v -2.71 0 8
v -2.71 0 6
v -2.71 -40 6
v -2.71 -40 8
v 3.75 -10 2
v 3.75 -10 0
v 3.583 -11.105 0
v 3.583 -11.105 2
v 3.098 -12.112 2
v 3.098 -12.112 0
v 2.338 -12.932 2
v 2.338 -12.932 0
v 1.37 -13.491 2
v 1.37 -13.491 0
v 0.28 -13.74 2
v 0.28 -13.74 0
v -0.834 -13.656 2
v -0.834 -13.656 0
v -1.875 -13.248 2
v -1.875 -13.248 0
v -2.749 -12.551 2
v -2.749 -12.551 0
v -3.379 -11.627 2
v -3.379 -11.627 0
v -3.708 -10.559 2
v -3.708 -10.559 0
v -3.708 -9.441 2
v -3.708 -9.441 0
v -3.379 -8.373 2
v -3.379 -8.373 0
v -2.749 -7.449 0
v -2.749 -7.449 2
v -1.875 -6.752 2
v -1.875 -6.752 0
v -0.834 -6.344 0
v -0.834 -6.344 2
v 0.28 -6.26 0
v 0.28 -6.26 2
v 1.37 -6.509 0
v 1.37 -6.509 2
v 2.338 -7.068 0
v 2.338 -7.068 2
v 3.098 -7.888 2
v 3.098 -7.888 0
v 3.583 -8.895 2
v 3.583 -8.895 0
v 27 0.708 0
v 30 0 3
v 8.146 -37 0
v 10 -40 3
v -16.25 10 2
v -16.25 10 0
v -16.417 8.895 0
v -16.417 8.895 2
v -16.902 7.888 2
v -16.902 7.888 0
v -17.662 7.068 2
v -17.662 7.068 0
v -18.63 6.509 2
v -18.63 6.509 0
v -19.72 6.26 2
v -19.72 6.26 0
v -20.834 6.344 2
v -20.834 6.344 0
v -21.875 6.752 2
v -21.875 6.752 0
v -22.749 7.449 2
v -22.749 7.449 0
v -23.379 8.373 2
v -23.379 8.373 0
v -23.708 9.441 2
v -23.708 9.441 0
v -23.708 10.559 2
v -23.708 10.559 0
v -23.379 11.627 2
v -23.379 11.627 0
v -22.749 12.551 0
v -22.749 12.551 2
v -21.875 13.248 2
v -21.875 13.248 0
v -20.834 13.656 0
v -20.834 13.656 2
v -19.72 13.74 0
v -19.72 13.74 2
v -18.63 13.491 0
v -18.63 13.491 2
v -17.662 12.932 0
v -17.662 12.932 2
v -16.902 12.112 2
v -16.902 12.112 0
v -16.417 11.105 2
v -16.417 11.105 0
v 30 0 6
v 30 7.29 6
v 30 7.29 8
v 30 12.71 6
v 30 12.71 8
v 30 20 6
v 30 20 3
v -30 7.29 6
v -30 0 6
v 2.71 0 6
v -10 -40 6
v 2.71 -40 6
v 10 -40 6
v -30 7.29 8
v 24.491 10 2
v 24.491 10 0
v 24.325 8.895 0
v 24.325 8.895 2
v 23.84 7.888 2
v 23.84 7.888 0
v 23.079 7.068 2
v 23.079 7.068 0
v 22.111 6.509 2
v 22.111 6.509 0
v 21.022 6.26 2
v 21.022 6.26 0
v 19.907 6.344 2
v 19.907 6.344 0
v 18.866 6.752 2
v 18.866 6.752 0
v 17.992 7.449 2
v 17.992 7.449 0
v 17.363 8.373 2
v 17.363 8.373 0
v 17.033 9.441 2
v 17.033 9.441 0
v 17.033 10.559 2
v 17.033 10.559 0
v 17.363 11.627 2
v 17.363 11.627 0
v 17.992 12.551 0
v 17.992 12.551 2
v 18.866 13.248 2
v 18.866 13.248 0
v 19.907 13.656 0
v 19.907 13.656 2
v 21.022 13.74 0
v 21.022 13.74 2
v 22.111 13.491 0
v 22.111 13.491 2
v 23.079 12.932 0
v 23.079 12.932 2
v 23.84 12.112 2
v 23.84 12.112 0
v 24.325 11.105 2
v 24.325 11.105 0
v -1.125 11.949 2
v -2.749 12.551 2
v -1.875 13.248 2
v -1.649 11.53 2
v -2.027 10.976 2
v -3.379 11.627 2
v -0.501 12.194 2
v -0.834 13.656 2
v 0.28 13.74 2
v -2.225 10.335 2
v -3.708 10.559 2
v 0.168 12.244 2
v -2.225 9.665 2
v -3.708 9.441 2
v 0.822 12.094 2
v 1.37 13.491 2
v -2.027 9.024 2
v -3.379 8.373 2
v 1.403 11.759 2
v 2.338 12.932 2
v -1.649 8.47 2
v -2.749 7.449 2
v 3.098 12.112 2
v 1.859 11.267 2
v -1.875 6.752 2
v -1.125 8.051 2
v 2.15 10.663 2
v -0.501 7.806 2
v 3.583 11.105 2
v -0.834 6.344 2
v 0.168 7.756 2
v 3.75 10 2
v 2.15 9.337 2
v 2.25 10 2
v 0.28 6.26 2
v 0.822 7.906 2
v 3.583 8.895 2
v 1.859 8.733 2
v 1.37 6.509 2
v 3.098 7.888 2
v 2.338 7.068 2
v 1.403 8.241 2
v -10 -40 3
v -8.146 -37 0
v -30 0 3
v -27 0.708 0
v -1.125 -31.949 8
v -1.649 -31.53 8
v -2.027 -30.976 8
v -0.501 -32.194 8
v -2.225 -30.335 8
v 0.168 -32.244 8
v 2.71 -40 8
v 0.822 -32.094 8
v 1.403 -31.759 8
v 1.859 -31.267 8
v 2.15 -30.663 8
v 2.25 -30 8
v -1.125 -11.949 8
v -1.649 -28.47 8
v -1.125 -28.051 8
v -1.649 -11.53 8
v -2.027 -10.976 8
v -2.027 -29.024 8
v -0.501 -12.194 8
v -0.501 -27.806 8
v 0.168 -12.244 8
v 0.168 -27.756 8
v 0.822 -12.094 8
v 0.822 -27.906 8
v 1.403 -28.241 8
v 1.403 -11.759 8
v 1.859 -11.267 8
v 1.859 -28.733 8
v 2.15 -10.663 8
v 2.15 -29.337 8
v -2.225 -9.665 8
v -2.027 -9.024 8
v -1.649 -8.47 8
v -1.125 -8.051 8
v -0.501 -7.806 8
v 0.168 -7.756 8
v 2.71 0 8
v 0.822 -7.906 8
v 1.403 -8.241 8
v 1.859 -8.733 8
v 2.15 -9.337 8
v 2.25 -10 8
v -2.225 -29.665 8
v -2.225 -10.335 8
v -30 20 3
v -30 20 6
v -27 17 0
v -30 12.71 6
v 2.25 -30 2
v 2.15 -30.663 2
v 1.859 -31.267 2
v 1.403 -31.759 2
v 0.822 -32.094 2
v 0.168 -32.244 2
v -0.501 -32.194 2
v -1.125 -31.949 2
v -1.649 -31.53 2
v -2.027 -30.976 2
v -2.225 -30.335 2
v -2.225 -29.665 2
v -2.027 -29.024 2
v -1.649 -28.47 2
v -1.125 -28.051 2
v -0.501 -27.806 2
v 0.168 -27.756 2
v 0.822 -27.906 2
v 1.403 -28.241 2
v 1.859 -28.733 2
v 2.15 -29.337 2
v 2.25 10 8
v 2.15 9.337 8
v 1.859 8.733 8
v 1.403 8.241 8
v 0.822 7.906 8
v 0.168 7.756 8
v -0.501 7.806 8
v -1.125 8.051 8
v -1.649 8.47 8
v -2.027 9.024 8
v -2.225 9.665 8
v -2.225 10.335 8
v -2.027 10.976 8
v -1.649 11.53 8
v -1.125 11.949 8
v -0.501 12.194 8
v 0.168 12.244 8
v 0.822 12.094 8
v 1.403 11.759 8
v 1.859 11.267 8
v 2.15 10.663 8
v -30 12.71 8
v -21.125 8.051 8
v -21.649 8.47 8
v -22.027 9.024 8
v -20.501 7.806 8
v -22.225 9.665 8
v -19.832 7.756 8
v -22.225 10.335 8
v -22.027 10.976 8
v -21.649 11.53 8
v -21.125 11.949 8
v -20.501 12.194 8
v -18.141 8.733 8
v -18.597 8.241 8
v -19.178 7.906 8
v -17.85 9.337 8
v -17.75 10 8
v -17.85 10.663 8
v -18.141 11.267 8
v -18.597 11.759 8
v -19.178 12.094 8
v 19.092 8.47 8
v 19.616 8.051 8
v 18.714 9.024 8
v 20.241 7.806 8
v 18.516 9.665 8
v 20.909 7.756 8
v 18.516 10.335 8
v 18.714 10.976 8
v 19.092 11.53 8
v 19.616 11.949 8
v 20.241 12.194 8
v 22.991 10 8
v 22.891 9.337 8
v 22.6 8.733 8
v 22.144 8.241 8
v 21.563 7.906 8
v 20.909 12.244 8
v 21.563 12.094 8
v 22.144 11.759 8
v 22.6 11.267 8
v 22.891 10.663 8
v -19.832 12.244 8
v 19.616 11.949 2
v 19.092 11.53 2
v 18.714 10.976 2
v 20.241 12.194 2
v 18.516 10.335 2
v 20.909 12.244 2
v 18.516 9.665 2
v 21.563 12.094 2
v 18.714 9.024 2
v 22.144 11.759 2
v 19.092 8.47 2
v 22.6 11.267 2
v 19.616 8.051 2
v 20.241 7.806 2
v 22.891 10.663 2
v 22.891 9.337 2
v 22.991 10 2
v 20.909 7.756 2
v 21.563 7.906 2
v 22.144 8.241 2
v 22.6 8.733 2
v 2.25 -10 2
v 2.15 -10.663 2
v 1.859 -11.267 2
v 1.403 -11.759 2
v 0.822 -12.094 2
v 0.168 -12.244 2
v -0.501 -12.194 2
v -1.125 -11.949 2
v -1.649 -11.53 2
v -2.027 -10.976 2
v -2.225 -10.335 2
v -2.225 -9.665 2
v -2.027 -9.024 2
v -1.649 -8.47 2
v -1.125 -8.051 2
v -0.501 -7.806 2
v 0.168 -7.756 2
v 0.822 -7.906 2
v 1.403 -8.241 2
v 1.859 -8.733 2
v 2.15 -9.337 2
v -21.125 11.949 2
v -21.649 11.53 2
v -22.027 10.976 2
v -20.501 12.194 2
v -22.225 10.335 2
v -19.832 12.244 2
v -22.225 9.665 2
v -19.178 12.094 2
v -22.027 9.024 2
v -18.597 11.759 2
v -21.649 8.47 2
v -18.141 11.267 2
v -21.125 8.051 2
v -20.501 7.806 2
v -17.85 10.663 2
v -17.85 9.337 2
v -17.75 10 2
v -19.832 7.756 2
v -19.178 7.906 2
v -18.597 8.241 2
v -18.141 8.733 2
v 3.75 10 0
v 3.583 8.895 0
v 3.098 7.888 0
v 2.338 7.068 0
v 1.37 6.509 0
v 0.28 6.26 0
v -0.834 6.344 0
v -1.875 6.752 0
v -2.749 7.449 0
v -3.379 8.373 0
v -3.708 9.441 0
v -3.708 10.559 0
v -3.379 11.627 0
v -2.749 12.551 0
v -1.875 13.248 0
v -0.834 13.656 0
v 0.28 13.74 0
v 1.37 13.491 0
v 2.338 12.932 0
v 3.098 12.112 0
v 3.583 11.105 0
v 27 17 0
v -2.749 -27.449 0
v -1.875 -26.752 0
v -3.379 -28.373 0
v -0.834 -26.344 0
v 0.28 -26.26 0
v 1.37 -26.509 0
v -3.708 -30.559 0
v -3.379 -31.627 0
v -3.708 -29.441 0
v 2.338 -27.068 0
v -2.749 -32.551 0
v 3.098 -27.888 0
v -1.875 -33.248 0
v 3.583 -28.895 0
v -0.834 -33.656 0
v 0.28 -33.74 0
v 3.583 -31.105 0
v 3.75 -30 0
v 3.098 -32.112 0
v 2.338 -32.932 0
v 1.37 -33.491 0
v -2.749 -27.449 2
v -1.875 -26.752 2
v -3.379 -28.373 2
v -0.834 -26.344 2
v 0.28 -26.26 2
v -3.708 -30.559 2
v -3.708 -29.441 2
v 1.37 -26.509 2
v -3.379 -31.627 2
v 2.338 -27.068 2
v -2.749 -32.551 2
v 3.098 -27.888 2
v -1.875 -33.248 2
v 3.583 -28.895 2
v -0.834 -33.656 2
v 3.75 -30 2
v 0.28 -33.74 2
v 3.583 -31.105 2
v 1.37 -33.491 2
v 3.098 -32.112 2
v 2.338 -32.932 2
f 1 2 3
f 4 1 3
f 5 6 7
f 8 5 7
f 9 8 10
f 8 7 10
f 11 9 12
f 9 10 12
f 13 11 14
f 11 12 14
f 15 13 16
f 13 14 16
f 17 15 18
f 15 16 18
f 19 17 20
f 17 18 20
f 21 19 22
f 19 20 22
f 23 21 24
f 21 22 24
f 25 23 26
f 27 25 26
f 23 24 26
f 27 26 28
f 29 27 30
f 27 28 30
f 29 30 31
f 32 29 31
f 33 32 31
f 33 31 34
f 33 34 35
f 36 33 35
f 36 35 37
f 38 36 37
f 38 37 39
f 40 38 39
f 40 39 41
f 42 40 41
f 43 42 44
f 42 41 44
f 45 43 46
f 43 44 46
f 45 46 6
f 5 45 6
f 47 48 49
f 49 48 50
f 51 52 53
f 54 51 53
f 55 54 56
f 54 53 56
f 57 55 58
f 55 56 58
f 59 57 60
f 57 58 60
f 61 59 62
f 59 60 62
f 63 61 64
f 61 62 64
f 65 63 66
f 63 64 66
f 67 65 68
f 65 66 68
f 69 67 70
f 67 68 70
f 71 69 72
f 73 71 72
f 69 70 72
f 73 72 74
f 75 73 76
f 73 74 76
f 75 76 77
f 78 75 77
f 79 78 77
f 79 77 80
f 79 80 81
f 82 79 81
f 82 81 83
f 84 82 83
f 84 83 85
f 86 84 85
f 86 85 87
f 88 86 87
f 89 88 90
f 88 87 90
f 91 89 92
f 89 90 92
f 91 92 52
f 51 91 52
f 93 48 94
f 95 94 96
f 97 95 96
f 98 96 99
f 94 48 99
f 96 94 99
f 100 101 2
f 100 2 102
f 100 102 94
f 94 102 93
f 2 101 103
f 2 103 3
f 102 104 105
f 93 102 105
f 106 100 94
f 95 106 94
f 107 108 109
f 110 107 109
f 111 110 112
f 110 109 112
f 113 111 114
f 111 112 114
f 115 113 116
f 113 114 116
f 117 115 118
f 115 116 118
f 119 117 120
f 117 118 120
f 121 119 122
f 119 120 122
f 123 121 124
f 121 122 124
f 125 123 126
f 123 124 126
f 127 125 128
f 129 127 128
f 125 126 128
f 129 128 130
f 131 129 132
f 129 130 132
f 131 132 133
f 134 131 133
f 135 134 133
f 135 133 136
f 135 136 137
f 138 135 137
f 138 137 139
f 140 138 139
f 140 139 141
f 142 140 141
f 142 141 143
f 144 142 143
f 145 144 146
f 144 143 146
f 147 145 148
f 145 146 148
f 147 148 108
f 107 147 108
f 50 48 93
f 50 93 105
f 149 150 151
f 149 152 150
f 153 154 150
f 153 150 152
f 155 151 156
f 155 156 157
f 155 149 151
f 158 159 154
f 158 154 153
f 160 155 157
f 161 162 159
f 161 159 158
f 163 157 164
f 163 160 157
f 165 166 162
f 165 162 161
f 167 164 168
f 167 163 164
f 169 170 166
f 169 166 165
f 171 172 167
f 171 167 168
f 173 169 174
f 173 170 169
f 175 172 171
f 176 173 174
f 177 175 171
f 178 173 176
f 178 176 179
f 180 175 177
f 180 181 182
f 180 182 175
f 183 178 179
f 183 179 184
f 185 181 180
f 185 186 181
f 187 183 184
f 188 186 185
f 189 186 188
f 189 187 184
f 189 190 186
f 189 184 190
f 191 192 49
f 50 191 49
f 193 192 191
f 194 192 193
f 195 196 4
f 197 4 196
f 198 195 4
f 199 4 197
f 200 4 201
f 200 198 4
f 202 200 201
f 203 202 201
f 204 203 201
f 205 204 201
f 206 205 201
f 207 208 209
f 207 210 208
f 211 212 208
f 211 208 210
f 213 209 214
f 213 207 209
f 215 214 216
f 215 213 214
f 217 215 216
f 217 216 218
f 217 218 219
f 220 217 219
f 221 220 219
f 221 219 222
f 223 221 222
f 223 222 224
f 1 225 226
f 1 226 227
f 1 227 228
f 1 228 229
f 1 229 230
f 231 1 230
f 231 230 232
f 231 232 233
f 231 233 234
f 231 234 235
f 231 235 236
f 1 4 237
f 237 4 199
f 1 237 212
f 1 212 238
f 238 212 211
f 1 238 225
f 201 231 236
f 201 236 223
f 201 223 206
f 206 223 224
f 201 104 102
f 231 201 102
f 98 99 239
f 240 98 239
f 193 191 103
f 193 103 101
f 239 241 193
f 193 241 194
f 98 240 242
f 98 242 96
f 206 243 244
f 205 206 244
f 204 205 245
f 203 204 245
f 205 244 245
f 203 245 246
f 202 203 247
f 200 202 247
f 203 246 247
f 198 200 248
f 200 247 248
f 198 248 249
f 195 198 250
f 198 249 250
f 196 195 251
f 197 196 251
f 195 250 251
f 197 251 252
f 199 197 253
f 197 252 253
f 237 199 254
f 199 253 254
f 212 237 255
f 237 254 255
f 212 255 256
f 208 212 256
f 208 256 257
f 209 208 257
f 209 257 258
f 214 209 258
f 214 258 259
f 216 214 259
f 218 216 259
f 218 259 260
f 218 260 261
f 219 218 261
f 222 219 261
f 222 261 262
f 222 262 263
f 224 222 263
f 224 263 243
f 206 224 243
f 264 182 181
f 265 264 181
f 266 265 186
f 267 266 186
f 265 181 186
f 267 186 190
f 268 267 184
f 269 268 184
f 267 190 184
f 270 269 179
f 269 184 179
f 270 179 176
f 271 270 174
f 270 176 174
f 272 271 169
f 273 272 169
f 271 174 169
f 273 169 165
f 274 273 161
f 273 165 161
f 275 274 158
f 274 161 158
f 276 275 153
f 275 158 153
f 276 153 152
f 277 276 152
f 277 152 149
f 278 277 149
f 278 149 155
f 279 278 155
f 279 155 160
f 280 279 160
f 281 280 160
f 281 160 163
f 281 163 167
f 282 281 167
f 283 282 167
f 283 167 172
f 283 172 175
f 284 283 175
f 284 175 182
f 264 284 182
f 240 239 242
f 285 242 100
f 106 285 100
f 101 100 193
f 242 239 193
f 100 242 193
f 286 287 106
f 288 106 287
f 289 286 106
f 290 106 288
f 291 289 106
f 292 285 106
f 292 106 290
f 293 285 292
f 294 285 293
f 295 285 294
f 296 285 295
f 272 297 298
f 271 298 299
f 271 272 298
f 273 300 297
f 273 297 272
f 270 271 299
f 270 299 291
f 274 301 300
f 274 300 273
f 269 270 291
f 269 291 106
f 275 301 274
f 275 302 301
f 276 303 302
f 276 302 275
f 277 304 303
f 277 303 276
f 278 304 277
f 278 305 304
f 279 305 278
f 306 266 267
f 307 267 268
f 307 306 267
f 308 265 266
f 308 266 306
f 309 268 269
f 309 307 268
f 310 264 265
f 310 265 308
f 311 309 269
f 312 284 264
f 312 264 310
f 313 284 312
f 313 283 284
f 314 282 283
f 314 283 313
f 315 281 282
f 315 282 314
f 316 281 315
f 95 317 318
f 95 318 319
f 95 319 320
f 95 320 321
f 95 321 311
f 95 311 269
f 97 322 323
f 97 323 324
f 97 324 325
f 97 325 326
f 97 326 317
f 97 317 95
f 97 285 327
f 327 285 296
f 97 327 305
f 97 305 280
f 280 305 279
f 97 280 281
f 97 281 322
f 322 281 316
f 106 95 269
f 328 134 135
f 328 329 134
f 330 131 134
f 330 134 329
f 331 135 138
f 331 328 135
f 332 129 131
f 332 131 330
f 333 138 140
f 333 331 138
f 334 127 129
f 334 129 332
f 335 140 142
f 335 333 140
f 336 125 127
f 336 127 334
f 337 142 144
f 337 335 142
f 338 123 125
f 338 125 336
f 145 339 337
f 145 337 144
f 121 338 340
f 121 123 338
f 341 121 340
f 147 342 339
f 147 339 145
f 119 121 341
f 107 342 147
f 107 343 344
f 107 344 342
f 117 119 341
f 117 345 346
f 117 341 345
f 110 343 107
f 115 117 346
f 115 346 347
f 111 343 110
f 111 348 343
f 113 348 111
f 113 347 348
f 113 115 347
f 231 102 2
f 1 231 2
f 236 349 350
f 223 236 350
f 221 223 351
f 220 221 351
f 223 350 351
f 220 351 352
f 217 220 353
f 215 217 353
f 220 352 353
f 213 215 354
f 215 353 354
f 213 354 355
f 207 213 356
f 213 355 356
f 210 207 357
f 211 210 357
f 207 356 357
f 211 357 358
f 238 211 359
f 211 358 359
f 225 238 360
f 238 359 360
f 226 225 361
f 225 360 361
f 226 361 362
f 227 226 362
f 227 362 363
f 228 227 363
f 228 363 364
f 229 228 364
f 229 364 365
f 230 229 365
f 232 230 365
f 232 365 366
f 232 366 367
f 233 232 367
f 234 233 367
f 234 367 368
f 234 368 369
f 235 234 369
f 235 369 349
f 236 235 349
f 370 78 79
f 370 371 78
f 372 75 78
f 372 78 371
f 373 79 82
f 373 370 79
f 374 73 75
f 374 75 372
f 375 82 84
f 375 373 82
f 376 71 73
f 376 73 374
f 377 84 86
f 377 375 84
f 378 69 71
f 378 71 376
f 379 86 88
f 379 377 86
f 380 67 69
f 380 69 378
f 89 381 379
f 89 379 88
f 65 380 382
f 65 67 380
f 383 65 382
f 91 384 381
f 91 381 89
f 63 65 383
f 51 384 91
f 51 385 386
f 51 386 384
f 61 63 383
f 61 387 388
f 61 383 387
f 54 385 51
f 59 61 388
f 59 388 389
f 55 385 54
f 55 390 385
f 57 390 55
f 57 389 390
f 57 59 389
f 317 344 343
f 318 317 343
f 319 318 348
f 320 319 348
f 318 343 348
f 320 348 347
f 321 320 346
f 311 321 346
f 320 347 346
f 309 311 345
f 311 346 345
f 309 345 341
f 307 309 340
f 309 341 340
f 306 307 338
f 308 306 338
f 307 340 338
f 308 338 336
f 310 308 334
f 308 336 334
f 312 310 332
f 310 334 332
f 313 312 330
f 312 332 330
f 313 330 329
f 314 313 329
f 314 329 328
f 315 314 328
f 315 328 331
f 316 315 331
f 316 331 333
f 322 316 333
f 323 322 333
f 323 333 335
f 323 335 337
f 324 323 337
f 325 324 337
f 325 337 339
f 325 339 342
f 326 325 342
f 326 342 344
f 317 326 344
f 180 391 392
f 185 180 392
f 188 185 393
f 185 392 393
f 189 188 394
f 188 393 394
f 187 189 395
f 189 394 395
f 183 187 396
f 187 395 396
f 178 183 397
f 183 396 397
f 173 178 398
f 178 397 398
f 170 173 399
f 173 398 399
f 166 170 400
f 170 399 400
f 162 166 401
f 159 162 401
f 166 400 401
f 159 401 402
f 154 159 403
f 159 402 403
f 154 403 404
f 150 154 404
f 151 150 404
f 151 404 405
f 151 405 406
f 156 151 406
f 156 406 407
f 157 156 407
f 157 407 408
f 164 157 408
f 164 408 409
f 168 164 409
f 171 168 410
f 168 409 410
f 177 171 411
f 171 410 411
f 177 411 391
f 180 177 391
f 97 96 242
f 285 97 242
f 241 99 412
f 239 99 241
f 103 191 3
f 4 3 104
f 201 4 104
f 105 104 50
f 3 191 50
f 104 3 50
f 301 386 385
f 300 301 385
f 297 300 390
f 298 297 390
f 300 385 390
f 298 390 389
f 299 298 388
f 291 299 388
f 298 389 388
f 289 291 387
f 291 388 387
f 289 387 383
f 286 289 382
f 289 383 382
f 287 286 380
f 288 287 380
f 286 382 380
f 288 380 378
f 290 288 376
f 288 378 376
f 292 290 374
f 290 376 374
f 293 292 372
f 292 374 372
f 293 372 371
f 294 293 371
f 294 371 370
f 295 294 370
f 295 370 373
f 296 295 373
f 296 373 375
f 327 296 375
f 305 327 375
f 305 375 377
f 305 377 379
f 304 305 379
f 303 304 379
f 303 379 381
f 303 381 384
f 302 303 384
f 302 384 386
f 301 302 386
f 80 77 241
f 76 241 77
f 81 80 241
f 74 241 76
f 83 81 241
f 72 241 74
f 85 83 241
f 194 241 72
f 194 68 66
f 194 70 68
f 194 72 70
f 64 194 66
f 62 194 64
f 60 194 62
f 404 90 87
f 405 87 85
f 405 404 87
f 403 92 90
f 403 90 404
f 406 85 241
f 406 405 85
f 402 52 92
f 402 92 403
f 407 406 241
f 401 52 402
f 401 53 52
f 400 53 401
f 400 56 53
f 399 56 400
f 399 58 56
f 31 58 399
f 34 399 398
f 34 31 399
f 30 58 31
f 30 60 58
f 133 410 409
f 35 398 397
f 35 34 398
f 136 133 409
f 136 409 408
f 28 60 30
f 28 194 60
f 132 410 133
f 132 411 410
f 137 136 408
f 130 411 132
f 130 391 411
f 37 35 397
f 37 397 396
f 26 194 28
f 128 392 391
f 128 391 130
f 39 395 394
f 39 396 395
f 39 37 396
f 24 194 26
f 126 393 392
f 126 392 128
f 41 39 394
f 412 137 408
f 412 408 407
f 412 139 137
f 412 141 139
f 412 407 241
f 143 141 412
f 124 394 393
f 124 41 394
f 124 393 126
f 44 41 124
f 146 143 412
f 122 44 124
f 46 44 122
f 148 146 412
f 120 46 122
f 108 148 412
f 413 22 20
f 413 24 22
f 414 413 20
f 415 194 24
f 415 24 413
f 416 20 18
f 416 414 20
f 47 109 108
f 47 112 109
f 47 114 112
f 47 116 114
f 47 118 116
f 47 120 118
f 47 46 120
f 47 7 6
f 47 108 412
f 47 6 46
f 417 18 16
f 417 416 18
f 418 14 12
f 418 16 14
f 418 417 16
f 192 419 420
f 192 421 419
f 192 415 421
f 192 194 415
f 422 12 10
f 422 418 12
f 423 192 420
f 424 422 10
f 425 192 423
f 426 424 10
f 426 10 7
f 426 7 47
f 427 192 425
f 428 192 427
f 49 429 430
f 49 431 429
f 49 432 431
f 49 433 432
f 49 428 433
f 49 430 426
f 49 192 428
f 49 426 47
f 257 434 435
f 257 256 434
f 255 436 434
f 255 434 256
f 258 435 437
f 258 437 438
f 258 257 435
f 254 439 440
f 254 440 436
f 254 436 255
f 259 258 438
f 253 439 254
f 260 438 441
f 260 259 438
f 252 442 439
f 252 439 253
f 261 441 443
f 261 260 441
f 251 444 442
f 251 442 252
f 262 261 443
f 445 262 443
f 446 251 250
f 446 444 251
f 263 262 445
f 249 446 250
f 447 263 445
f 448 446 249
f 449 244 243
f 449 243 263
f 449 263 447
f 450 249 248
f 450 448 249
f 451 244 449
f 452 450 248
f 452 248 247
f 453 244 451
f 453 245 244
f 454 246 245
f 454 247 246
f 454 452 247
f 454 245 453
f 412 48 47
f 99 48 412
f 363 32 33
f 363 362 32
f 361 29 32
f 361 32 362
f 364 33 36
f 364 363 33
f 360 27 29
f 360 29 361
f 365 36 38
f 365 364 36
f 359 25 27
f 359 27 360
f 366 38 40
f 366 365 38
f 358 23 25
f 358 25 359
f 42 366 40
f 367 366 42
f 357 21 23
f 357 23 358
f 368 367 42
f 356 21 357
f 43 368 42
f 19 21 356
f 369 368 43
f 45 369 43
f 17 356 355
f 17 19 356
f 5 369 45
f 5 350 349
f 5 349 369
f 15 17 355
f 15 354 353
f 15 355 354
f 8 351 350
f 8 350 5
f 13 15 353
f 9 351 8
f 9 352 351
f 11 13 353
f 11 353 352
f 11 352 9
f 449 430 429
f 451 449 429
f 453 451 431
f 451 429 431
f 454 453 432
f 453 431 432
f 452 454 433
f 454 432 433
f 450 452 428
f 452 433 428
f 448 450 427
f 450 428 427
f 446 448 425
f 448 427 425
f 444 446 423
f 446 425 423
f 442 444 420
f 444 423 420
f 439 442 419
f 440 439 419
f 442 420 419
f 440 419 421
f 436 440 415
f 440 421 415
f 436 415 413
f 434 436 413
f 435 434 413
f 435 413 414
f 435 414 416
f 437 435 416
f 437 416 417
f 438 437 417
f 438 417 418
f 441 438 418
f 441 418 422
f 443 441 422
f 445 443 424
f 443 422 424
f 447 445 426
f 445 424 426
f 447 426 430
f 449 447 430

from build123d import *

# Parameters (mm, degrees)
F1_DEPTH = 6
F3_DEPTH = 2
F4_R     = 2.25
F5_DEPTH = 8.001
F6_R     = 3.75
F7_DEPTH = 2
F9_DEPTH = 6
F10_SIZE = 3


with BuildPart() as f1:
    # F0 (on Top) → F1 (new body)
    with BuildSketch(Plane.XY):
        Polygon((-30, 0), (-10, 0), (-10, -40), (0, -40), (10, -40), (10, 0), (30, 0), (30, 20), (0, 20), (-30, 20), align=None)
    extrude(amount=F1_DEPTH)

    # F2 (on face) → F3 (join)
    with BuildSketch(Plane.XY.offset(6)):
        Polygon((2.71, 0), (0, 0), (-2.71, 0), (-2.71, -40), (2.71, -40), align=None)
        Polygon((30, 7.29), (30, 12.71), (-30, 12.71), (-30, 10), (-30, 7.29), align=None)
    extrude(amount=F3_DEPTH)

    # F4 (on face) → F5 (cut, through all)
    with BuildSketch(Plane(origin=(0, 0, 0), x_dir=(1, 0, 0), z_dir=(0, 0, -1))):
        with Locations((-20, -10)):
            Circle(F4_R)
        with Locations((0, 10)):
            Circle(F4_R)
        with Locations((0, 30)):
            Circle(F4_R)
        with Locations((20.741304, -10)):
            Circle(F4_R)
        with Locations((0, -10)):
            Circle(F4_R)
    extrude(amount=-F5_DEPTH, mode=Mode.SUBTRACT)

    # F6 (on face) → F7 (cut)
    with BuildSketch(Plane(origin=(0, 0, 0), x_dir=(1, 0, 0), z_dir=(0, 0, -1))):
        with Locations((0, 30)):
            Circle(F6_R)
        with Locations((0, 10)):
            Circle(F6_R)
        with Locations((20.741304, -10)):
            Circle(F6_R)
        with Locations((-20, -10)):
            Circle(F6_R)
        with Locations((0, -10)):
            Circle(F6_R)
    extrude(amount=-F7_DEPTH, mode=Mode.SUBTRACT)

    # F8 (on face) → F9 (join)
    with BuildSketch(Plane(origin=(0, 0, 0), x_dir=(1, 0, 0), z_dir=(0, 0, -1))):
        Polygon((-10, 0), (-10, 40), (-30, 0), align=None)
        Polygon((30, 0), (10, 40), (10, 0), align=None)
    extrude(amount=-F9_DEPTH)

    # F10
    f10_edges = [f1.edges().sort_by_distance(p)[0] for p in [
        (0, -40, 0),
        (-20, -20, 0),
        (20, -20, 0),
        (30, 10, 0),
        (0, 20, 0),
        (-30, 10, 0),
    ]]
    chamfer(f10_edges, length=F10_SIZE)


solid = f1.part
